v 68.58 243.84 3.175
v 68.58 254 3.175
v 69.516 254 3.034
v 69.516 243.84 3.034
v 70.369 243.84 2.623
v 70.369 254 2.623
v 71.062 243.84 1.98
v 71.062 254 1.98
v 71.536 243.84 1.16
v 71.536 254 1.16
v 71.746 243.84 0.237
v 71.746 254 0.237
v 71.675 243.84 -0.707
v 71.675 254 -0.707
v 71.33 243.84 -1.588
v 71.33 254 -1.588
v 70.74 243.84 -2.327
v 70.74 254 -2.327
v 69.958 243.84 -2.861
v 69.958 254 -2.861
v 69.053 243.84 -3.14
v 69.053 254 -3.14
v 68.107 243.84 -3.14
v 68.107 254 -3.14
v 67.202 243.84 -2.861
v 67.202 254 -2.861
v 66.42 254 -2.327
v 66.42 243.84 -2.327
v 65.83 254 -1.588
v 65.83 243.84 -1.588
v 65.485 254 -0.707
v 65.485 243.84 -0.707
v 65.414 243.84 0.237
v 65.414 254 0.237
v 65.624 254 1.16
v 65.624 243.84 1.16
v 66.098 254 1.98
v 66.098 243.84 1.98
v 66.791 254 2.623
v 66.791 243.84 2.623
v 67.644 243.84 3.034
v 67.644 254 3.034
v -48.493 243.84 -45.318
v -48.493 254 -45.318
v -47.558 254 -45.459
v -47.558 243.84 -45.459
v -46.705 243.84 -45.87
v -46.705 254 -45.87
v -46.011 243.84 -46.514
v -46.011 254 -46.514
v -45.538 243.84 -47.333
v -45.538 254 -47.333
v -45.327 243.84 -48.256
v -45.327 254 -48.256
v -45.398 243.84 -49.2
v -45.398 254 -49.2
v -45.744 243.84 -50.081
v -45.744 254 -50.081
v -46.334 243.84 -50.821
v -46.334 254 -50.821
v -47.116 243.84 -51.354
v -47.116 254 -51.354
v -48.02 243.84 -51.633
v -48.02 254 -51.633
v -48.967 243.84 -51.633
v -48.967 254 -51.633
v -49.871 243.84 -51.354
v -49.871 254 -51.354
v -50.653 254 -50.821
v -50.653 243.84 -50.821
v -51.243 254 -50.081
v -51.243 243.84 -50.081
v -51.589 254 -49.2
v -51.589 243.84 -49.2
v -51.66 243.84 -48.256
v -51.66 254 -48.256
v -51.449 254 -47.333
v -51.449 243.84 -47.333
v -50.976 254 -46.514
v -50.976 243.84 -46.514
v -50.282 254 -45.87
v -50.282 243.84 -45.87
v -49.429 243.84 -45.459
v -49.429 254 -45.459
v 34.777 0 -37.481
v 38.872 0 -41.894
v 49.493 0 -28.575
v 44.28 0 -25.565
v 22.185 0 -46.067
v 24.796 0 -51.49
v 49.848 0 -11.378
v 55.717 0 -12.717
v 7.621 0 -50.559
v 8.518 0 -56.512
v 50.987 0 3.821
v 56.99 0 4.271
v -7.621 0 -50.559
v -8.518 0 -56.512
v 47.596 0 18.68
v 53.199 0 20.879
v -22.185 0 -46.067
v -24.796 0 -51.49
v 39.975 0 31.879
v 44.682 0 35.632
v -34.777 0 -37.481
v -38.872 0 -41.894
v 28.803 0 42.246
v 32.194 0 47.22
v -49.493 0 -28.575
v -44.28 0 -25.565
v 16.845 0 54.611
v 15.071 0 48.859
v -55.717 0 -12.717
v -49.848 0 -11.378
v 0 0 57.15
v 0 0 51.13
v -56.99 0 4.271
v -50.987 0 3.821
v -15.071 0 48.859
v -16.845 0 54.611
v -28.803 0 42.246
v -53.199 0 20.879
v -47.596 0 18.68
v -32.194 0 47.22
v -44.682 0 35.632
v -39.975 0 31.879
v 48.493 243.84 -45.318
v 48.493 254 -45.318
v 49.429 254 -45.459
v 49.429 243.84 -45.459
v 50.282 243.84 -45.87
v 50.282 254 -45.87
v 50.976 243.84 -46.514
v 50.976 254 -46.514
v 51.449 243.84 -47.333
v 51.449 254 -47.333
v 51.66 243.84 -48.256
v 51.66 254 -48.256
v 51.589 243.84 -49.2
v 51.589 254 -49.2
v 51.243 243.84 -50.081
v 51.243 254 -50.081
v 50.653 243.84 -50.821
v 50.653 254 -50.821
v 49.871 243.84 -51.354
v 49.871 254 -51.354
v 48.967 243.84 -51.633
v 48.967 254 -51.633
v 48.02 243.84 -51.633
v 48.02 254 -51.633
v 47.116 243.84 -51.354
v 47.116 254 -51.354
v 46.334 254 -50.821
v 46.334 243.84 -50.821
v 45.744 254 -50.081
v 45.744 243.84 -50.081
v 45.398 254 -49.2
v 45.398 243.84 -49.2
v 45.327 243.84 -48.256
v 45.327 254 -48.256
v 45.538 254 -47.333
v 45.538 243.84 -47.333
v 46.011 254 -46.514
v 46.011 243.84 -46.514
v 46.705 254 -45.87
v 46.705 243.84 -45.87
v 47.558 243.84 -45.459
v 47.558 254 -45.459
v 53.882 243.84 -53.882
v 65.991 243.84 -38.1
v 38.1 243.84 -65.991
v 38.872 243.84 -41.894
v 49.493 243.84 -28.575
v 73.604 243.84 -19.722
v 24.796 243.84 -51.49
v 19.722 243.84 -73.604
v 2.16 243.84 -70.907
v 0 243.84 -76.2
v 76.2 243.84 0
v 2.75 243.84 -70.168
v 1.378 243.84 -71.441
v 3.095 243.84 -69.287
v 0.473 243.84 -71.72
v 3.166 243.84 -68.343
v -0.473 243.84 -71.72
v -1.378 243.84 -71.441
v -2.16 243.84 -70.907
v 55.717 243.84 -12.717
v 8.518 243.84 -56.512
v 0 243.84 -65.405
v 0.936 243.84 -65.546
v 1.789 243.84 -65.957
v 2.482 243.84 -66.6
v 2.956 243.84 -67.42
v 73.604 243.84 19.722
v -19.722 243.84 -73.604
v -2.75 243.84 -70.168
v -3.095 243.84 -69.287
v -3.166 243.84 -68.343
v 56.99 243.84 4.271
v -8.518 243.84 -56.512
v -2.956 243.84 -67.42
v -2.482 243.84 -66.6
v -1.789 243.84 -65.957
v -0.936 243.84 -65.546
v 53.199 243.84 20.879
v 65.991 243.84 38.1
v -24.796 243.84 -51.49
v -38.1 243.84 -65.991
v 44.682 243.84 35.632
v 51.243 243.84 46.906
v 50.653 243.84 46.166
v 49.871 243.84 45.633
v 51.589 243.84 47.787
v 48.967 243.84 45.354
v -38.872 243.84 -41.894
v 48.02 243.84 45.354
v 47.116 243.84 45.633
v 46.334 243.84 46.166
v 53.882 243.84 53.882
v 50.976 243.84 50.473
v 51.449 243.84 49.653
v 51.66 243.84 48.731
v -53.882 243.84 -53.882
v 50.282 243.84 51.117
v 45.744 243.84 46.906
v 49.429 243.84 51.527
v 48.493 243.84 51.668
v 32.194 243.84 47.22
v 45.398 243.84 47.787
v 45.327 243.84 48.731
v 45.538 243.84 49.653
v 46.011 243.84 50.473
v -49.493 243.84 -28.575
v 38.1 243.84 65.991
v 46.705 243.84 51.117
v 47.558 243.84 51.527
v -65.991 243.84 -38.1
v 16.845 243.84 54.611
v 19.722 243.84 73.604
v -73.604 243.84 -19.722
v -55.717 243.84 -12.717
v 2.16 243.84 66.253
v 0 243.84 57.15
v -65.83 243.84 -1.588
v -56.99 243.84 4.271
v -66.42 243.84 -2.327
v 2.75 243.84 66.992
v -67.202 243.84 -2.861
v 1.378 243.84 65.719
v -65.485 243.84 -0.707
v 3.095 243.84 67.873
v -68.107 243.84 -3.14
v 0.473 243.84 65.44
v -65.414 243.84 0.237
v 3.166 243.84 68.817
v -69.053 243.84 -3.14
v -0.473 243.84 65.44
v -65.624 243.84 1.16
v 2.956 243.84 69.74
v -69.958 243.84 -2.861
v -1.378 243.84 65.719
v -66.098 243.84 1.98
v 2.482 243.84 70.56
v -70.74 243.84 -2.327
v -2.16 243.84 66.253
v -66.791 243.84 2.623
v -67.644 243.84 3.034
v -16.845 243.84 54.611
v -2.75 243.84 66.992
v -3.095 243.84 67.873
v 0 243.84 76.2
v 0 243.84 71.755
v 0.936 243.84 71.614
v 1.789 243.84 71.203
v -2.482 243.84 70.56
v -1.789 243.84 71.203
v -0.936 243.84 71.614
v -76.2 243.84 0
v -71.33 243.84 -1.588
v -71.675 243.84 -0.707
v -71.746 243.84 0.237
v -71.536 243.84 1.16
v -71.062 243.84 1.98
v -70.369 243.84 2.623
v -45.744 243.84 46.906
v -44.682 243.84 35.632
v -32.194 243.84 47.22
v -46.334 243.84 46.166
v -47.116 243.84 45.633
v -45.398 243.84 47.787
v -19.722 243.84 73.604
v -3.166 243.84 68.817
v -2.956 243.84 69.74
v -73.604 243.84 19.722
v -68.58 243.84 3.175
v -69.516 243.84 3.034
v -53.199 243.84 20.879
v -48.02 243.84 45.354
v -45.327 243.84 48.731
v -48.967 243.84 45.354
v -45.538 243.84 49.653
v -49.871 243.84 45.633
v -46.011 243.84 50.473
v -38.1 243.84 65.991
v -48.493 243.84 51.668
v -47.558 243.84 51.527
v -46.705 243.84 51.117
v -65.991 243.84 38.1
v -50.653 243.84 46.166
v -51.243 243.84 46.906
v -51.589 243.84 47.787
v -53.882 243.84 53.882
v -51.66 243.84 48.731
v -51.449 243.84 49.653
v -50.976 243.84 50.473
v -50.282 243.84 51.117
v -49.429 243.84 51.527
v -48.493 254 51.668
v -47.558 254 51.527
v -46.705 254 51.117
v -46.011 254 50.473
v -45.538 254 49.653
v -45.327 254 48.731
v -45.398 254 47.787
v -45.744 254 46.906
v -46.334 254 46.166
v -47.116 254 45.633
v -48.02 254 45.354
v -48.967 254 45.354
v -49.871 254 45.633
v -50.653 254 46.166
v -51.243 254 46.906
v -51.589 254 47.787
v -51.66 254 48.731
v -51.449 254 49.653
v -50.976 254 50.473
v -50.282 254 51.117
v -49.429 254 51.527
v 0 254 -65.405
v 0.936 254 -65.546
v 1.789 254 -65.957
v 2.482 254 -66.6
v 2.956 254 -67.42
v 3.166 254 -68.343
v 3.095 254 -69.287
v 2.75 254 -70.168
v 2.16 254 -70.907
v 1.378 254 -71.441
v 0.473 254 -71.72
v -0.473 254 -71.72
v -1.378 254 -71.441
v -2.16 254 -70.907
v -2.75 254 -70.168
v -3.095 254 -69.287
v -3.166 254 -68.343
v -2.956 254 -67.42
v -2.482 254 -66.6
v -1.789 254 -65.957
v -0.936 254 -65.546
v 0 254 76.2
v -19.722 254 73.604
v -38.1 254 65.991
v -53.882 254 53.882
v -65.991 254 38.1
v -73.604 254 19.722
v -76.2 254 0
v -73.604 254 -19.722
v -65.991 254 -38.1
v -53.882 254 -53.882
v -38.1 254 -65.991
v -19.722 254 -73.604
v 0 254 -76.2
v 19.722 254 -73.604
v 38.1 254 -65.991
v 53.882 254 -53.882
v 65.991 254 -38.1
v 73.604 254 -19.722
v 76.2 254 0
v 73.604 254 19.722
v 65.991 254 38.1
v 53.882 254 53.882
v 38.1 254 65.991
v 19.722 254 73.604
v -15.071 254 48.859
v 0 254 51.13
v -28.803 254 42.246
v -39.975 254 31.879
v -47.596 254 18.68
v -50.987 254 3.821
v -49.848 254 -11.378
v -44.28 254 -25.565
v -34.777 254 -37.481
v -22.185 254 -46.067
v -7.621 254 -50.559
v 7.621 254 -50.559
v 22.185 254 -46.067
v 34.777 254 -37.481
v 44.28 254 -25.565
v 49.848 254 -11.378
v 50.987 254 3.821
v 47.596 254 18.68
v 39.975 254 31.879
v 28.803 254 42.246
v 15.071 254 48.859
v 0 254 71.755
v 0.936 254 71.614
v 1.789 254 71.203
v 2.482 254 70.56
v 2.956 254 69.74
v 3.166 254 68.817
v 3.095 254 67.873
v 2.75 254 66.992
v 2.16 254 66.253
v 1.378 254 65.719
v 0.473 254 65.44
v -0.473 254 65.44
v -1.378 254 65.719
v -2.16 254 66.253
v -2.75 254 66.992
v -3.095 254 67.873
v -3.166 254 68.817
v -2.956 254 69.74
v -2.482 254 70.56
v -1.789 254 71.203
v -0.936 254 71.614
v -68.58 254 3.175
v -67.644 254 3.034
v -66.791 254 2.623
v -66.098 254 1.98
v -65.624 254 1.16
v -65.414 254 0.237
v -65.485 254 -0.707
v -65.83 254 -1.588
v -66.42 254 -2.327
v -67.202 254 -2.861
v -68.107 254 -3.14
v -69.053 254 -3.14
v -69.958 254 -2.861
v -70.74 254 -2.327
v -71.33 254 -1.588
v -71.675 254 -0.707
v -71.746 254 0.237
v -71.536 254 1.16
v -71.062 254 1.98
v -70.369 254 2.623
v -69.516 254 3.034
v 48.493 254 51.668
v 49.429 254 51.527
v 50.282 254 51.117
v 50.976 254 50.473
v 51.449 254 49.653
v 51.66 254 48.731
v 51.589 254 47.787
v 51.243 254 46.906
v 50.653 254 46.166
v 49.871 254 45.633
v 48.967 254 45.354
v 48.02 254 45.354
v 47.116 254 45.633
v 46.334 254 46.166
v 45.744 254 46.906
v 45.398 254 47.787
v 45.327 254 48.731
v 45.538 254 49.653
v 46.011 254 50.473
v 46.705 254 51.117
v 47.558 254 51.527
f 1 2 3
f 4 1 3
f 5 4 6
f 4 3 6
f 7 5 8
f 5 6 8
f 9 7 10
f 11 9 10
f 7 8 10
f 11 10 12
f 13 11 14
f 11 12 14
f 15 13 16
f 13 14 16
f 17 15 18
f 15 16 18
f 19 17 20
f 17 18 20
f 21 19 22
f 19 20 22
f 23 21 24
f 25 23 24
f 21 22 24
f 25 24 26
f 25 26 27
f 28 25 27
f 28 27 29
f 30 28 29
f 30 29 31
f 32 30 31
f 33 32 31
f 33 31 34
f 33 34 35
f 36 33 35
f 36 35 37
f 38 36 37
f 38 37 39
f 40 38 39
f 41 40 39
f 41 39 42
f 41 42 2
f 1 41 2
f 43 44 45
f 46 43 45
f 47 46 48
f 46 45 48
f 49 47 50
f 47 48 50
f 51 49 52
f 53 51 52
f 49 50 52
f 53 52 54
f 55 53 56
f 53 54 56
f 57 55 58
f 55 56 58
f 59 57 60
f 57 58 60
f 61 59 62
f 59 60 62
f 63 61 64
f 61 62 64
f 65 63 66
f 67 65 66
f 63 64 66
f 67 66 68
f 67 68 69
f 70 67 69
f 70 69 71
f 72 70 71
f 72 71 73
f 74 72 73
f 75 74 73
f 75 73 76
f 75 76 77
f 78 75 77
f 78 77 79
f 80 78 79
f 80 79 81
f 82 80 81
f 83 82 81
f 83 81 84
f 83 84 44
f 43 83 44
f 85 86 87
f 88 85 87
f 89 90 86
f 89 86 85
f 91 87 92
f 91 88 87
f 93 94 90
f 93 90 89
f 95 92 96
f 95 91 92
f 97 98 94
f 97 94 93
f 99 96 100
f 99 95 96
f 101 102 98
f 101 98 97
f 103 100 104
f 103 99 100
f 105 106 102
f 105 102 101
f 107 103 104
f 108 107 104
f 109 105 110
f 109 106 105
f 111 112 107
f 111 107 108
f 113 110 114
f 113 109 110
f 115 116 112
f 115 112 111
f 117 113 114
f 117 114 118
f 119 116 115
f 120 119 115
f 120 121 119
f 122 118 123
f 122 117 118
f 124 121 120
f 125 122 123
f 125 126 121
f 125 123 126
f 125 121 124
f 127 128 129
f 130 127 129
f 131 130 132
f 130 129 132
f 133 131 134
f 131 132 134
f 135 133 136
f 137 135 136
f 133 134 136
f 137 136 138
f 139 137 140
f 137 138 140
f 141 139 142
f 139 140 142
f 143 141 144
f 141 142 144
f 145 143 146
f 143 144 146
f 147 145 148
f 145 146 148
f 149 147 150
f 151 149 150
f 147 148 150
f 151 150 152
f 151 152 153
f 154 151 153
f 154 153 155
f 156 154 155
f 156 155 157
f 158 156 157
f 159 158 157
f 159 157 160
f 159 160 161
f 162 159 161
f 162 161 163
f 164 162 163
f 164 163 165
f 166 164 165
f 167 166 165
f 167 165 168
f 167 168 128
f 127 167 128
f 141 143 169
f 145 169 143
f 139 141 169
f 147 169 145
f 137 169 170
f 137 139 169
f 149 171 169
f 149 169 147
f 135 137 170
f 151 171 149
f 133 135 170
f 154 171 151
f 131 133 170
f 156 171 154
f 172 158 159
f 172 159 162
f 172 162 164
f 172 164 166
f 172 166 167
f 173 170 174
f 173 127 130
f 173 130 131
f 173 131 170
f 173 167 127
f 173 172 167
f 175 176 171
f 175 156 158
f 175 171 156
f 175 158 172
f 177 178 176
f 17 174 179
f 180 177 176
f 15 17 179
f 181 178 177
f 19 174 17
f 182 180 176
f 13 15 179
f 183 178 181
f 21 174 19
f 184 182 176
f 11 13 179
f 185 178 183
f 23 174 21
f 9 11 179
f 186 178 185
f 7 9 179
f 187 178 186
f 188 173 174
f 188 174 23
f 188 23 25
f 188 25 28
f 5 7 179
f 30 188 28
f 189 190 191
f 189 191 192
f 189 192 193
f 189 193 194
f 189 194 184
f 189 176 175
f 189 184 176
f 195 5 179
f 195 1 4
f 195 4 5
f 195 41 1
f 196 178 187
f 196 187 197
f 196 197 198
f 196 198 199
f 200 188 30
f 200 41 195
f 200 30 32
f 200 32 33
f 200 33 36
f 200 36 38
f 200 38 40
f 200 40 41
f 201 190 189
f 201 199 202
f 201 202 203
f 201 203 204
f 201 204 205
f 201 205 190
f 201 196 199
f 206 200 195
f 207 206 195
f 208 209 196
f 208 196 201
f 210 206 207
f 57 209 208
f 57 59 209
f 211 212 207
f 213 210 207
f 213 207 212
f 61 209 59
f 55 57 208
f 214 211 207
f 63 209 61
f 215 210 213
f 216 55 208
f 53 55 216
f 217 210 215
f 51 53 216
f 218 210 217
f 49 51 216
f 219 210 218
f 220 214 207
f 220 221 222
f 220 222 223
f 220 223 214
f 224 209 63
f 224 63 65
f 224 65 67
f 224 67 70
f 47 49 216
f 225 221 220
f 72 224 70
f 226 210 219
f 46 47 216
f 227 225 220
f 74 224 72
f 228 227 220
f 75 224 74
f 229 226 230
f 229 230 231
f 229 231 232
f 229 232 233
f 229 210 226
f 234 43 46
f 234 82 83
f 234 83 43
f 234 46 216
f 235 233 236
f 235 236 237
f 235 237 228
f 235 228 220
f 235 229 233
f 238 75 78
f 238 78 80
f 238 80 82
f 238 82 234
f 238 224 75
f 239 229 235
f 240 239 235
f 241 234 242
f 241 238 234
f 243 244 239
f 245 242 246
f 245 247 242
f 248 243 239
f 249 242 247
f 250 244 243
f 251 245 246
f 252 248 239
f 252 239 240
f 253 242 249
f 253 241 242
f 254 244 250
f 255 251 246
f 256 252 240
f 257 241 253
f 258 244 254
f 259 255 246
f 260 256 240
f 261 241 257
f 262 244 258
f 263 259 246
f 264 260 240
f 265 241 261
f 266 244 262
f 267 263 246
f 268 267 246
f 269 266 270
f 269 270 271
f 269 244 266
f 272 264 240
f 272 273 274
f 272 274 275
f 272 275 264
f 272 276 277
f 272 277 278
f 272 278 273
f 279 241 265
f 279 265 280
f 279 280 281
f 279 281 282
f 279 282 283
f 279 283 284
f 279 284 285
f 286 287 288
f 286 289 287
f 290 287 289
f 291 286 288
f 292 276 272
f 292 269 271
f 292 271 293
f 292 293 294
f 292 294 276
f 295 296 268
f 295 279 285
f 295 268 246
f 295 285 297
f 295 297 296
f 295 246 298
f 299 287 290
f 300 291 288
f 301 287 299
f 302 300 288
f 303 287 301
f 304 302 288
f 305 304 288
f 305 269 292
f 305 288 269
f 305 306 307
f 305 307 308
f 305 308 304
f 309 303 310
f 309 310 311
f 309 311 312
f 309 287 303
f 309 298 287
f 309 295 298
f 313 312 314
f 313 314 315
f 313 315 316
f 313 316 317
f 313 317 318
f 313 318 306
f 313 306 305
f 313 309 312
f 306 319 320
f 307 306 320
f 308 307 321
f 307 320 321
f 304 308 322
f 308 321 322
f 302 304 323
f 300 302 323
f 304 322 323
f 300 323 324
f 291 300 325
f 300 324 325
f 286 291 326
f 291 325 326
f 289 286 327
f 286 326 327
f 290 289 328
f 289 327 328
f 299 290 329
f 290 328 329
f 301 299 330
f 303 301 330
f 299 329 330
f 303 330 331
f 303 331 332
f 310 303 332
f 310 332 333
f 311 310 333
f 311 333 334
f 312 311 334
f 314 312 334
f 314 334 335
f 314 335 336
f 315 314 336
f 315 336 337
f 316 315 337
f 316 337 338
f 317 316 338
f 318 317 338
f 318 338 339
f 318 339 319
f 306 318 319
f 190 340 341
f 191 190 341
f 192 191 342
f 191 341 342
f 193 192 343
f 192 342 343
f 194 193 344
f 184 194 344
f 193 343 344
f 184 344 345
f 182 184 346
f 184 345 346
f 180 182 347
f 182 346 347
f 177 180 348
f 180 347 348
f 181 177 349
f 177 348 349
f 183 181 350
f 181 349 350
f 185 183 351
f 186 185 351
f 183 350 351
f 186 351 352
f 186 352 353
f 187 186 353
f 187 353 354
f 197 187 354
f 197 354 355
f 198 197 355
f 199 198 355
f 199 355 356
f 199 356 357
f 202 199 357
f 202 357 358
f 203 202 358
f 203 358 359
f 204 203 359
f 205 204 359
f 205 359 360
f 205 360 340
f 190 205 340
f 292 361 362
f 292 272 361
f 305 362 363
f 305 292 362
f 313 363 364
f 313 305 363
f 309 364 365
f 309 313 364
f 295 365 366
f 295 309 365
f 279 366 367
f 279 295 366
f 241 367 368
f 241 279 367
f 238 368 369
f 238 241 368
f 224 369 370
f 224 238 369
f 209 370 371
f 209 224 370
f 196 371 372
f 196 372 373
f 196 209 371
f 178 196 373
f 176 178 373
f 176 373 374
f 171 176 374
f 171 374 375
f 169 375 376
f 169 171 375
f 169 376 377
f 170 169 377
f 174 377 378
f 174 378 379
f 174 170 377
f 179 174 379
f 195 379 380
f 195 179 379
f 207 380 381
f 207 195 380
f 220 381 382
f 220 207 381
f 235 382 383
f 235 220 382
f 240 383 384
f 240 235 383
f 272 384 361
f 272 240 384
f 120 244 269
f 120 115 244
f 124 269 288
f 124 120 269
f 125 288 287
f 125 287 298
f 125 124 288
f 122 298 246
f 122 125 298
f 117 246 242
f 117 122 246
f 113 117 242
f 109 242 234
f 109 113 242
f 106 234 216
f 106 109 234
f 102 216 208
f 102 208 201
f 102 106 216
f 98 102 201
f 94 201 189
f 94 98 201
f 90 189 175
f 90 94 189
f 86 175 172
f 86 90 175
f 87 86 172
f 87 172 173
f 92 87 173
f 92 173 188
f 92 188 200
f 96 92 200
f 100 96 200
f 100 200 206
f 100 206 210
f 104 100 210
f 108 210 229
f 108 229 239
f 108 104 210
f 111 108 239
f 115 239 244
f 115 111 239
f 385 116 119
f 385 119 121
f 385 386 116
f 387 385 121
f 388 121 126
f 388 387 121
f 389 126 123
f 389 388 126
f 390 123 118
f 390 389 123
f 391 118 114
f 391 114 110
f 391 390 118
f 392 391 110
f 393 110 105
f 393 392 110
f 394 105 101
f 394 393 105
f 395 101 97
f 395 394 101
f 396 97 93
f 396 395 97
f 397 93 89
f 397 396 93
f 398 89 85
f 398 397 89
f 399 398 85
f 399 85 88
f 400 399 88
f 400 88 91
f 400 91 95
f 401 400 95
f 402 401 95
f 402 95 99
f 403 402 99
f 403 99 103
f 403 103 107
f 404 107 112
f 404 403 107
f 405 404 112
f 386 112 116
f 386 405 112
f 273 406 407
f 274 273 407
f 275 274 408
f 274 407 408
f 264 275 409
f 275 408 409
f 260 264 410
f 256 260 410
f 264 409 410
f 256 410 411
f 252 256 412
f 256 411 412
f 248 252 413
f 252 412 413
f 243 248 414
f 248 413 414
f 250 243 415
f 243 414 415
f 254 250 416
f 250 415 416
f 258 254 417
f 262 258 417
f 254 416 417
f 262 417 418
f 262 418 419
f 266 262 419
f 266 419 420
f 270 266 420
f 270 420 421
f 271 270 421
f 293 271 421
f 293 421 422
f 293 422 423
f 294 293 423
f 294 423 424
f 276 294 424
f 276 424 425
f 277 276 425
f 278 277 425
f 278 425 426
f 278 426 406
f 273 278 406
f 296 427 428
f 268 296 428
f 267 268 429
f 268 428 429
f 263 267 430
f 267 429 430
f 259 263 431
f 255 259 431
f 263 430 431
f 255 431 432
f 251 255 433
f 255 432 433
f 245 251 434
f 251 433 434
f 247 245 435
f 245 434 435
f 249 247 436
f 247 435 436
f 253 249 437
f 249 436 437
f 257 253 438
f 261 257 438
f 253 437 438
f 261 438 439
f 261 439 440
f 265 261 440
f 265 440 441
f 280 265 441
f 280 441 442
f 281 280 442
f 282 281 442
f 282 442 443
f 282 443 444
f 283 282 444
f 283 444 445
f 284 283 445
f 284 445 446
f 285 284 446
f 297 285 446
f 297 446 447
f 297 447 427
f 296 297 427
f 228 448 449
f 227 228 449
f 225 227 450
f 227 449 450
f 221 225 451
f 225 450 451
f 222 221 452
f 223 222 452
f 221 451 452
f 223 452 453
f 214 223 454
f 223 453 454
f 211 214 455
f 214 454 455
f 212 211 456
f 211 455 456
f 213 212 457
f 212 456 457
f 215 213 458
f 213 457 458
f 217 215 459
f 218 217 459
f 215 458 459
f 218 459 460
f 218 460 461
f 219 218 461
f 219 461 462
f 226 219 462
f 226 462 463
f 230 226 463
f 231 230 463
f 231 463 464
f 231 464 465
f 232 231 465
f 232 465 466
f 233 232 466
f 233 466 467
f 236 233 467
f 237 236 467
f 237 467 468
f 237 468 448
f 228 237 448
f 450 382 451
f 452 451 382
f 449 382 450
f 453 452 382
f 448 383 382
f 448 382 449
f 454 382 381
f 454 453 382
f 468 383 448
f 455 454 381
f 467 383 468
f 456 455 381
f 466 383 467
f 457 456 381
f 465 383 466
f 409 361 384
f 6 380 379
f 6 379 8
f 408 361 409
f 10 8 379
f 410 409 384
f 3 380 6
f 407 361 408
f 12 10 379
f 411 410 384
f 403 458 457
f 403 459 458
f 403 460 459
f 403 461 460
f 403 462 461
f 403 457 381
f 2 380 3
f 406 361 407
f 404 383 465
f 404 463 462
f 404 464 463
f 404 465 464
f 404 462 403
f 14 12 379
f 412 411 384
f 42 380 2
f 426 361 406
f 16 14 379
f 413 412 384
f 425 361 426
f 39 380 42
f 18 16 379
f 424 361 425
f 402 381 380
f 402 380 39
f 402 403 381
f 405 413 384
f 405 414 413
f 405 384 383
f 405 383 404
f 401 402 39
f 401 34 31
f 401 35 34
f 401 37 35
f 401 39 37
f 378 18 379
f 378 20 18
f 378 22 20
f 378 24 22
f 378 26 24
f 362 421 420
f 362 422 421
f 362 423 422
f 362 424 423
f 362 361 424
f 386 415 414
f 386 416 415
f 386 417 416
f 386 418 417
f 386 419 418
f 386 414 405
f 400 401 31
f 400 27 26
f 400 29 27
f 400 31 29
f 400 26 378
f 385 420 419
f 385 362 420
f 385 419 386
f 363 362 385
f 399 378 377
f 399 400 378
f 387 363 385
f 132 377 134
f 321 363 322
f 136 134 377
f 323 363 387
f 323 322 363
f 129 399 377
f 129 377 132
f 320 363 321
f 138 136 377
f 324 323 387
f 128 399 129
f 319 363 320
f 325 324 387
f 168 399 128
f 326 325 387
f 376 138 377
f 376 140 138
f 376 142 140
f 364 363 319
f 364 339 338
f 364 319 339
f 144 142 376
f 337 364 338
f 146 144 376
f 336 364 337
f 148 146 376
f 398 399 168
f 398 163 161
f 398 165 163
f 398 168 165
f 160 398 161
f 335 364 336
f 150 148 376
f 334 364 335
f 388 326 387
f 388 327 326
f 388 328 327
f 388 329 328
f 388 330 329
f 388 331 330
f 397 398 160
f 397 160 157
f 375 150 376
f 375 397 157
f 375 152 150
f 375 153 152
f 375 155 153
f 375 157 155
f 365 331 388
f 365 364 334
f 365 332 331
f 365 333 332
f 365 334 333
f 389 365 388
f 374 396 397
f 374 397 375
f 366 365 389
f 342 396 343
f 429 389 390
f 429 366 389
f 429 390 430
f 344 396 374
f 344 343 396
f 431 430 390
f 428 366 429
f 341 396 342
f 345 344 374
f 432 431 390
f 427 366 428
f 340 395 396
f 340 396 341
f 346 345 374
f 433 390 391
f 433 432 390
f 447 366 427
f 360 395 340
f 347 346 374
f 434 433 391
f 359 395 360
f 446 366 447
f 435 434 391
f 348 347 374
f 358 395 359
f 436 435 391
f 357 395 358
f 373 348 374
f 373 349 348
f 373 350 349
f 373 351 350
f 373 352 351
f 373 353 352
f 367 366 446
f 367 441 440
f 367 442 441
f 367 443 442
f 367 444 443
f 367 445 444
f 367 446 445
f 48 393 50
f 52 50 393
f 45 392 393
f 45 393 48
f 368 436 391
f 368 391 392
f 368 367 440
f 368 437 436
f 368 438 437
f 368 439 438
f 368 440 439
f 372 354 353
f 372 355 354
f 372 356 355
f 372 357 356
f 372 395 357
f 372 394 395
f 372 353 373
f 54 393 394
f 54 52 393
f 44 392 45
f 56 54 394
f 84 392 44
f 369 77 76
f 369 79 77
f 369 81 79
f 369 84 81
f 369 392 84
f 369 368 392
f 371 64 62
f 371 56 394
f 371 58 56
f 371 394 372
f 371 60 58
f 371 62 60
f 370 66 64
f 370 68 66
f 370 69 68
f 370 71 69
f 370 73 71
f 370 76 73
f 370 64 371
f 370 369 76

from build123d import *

# Parameters (mm, degrees)
BOLT_HOLES_PROFILE_R = 3.175
BOLT_HOLES_DEPTH     = 276.914624476


with BuildPart() as part:
    # Shell Profile → Shell Revolve (revolve)
    with BuildSketch(Plane.XY, mode=Mode.PRIVATE) as shell_revolve_sk:
        Polygon((51.1302, 0), (51.1302, 254), (76.2, 254), (76.2, 243.84), (57.15, 243.84), (57.15, 0), align=None)
    revolve(shell_revolve_sk.sketch.rotate(Axis((0, 0, 0), (0, -1, 0)), 90), axis=Axis((0, 0, 0), (0, -1, 0)))

    # Bolt Holes Profile → Bolt Holes (cut, through all)
    with BuildSketch(Plane(origin=(0, 254, 0), x_dir=(1, 0, 0), z_dir=(0, 1, 0))):
        with Locations(Location((0, 68.58, 0), (0, 0, 270))):
            Circle(BOLT_HOLES_PROFILE_R)
        with Locations(Location((48.493383054, 48.493383054, 0), (0, 0, 270))):
            Circle(BOLT_HOLES_PROFILE_R)
        with Locations(Location((68.58, 0, 0), (0, 0, 270))):
            Circle(BOLT_HOLES_PROFILE_R)
        with Locations(Location((48.493383054, -48.493383054, 0), (0, 0, 270))):
            Circle(BOLT_HOLES_PROFILE_R)
        with Locations(Location((0, -68.58, 0), (0, 0, 270))):
            Circle(BOLT_HOLES_PROFILE_R)
        with Locations(Location((-48.493383054, -48.493383054, 0), (0, 0, 270))):
            Circle(BOLT_HOLES_PROFILE_R)
        with Locations(Location((-68.58, 0, 0), (0, 0, 270))):
            Circle(BOLT_HOLES_PROFILE_R)
        with Locations(Location((-48.493383054, 48.493383054, 0), (0, 0, 270))):
            Circle(BOLT_HOLES_PROFILE_R)
    extrude(amount=-BOLT_HOLES_DEPTH, mode=Mode.SUBTRACT)


solid = part.part
